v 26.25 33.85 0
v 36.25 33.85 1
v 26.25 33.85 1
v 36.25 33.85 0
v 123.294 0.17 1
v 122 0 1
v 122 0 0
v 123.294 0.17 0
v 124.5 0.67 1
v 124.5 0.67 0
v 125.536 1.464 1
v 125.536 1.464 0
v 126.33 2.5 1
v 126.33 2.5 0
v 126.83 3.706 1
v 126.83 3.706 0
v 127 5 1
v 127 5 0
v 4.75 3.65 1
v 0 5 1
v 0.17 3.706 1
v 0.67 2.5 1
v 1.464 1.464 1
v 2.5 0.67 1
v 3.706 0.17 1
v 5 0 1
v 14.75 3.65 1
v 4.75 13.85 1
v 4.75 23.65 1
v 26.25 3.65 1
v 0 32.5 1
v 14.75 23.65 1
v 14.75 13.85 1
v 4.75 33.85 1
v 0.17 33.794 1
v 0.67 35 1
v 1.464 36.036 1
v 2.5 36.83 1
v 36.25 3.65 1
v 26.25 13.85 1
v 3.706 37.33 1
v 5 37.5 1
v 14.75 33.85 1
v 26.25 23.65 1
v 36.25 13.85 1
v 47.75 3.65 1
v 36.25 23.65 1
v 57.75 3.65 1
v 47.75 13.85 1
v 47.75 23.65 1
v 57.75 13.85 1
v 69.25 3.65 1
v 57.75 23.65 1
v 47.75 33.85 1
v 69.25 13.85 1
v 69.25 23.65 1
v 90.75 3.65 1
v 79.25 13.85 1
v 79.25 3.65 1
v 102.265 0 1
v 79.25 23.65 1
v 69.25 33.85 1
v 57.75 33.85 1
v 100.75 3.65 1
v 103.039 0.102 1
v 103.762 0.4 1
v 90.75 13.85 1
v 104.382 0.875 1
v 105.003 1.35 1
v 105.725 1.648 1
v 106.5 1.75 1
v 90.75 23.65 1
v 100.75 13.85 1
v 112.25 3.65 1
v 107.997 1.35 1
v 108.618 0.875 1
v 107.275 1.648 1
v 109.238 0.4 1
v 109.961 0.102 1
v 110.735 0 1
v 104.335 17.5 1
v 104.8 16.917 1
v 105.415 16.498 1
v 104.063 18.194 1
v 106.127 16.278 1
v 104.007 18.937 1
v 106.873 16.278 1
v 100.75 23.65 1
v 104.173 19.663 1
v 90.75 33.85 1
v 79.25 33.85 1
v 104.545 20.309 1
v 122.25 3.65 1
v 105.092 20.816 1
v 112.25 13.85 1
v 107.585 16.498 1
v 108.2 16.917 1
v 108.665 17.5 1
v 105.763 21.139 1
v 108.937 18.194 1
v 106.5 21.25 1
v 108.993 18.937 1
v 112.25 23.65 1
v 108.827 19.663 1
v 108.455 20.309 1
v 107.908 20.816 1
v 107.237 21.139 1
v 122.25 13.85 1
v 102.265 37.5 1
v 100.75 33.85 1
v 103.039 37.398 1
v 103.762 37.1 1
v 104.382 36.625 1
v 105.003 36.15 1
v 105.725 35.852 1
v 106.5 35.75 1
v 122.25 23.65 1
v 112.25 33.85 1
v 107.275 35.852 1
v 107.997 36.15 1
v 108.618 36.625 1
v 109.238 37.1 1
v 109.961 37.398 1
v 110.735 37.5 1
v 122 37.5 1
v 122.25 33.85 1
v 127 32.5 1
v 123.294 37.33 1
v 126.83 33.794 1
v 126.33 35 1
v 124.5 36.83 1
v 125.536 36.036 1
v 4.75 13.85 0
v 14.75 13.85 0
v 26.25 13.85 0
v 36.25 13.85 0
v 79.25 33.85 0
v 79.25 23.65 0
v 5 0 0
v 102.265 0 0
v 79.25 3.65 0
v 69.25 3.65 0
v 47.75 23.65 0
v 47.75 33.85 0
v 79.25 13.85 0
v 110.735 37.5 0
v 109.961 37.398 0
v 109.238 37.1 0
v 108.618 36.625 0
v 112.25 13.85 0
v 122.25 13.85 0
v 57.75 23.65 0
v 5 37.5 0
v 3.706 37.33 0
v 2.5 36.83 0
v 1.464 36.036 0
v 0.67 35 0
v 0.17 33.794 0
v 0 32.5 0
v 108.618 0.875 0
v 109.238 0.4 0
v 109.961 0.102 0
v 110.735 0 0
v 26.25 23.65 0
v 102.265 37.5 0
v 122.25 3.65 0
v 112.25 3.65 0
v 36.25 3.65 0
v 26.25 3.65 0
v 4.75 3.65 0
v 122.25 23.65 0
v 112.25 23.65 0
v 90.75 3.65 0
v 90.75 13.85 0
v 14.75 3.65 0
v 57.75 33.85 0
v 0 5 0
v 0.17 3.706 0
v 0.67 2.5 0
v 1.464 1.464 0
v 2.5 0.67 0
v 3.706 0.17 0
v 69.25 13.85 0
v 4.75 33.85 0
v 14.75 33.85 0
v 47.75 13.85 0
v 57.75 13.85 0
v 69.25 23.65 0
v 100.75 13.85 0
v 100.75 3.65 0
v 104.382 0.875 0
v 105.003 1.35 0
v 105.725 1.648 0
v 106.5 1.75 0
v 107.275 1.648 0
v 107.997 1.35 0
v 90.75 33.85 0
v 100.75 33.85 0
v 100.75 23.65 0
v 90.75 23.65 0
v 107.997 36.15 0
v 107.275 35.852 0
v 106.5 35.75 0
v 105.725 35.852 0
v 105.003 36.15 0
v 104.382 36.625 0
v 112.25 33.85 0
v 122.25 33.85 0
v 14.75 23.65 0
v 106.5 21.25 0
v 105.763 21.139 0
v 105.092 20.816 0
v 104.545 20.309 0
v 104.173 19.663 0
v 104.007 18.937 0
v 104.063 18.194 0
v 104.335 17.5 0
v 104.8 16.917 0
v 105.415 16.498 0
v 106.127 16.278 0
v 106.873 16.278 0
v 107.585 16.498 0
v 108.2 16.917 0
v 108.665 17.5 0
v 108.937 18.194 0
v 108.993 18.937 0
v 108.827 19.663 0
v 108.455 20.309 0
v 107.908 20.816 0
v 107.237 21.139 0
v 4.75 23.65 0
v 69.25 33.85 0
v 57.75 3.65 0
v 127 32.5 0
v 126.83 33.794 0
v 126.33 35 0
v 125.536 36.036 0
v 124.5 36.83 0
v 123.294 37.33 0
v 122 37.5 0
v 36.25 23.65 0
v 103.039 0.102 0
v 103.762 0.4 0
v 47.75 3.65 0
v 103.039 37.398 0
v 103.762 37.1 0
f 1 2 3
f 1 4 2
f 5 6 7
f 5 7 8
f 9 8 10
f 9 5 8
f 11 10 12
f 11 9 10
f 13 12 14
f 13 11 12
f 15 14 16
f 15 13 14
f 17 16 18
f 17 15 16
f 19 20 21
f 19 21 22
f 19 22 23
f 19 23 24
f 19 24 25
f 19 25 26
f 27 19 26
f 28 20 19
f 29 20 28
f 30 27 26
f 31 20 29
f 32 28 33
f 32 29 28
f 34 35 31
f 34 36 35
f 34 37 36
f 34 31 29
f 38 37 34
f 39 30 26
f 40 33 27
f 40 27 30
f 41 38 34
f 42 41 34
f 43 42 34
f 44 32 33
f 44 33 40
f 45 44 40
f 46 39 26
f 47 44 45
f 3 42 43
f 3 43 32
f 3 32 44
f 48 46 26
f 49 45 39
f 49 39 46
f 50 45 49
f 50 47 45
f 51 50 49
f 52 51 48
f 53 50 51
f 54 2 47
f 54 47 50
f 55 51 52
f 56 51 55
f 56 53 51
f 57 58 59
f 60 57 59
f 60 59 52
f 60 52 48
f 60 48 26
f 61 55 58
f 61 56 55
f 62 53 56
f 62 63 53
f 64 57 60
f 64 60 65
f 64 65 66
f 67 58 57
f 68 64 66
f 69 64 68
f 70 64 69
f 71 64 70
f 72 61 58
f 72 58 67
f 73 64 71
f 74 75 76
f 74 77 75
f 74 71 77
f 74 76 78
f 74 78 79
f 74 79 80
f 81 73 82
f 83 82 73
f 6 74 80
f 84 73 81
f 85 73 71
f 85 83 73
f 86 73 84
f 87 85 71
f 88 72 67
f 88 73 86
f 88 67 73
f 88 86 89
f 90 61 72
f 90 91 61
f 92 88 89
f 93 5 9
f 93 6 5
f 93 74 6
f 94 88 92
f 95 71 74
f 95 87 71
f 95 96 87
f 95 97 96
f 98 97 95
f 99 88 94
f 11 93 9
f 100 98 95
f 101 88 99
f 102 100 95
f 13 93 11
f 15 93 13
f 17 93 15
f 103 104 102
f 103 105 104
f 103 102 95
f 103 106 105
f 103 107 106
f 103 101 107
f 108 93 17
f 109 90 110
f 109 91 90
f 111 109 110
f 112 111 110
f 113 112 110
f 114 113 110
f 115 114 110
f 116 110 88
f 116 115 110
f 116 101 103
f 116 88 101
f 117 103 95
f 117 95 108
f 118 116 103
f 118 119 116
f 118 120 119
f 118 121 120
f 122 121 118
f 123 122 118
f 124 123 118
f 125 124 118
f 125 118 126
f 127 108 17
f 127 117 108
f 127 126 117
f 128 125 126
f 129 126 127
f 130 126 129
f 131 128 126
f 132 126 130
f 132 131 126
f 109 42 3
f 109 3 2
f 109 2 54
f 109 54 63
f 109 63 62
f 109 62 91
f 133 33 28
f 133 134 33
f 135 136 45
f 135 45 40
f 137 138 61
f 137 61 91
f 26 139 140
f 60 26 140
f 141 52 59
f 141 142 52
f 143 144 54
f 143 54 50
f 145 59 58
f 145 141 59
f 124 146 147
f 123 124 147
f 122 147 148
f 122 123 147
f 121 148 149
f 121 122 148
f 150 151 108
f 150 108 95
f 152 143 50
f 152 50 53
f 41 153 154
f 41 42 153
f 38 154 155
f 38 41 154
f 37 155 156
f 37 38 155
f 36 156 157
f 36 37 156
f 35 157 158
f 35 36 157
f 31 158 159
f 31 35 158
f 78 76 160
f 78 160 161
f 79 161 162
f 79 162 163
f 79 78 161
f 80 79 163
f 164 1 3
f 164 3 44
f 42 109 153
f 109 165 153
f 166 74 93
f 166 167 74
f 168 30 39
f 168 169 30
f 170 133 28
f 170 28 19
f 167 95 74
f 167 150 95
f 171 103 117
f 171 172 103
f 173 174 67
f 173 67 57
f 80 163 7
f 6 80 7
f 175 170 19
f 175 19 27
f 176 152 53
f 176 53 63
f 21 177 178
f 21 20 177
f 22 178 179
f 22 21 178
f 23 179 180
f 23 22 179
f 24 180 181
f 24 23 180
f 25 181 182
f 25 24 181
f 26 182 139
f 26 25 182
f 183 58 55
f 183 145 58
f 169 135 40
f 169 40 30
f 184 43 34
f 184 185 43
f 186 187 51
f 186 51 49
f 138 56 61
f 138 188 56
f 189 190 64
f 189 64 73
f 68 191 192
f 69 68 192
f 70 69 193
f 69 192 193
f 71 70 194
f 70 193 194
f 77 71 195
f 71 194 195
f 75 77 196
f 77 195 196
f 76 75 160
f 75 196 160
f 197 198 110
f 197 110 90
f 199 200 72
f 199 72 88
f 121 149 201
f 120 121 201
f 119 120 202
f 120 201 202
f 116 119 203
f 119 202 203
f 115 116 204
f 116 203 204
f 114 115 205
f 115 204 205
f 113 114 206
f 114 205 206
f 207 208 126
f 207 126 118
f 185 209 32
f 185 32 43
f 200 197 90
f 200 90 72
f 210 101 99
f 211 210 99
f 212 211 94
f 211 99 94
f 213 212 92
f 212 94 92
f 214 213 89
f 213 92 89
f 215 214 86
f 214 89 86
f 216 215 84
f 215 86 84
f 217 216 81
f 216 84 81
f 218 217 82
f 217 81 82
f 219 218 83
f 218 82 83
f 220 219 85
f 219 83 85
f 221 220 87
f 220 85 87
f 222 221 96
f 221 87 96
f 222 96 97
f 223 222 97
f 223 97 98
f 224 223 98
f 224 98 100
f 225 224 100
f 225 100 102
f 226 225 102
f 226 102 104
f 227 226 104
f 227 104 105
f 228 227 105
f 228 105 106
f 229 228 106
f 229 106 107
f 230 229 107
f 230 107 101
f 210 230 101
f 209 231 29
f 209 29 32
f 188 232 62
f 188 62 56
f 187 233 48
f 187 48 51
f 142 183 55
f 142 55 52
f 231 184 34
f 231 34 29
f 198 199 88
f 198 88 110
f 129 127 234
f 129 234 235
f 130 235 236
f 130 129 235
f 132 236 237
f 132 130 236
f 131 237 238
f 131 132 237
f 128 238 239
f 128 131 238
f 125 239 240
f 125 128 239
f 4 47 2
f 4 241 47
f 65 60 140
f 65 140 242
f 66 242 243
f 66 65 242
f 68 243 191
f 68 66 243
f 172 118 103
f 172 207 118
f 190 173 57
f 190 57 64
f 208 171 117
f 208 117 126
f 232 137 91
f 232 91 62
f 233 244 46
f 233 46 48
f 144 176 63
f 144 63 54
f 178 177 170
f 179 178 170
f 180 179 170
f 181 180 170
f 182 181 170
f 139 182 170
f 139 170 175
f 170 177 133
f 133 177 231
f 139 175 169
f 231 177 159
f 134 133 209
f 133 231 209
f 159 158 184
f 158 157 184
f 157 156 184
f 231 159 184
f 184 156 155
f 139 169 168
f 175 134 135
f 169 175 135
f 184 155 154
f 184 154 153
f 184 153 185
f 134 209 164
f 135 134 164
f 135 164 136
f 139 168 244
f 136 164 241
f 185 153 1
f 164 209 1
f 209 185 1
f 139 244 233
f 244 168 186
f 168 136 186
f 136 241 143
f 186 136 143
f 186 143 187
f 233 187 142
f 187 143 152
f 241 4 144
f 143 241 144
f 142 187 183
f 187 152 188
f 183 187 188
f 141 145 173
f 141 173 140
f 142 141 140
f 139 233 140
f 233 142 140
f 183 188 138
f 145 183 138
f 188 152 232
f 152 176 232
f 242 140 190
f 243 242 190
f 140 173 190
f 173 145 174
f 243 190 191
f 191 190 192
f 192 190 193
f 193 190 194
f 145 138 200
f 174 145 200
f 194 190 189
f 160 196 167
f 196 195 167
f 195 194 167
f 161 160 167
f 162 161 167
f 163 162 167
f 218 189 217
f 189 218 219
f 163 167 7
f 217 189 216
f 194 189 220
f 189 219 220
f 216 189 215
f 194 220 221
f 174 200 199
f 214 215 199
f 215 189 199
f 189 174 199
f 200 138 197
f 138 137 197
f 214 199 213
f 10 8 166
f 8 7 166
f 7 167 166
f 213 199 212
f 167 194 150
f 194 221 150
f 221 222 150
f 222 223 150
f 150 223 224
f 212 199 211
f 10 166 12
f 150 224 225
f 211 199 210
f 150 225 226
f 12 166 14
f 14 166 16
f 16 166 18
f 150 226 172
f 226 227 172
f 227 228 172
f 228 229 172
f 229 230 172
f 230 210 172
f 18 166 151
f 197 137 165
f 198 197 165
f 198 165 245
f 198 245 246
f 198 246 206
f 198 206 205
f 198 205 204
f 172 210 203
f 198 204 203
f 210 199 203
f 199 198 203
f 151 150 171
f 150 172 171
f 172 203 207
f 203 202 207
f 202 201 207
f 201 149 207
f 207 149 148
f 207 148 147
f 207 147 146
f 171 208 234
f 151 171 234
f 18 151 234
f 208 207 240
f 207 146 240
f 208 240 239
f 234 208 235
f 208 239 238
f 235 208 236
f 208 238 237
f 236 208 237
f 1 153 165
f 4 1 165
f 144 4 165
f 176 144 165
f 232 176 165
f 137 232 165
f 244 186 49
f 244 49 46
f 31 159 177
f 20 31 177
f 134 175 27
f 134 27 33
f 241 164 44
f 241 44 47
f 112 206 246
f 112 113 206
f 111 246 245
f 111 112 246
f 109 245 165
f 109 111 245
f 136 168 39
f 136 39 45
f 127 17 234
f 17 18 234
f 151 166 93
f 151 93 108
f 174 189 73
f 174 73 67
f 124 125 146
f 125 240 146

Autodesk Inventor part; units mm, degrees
ref_plane "YZ Plane" through (0, 0, 0) normal (1, 0, 0) x (0, 1, 0)
ref_plane "XZ Plane" through (0, 0, 0) normal (0, 1, 0) x (-1, 0, 0)
ref_plane "XY Plane" through (0, 0, 0) normal (0, 0, 1) x (1, 0, 0)
sketch "Skizze1" plane through (0, 0, 0) normal (0, 0, 1) x (1, 0, 0)
  line L0 (0, 0) -> (127, 0)
  line L1 (127, 0) -> (127, 37.5)
  line L2 (127, 37.5) -> (0, 37.5)
  line L3 (0, 37.5) -> (0, 0)
  line L4 (4.75, 3.65) -> (14.75, 3.65)
  line L5 (14.75, 3.65) -> (14.75, 13.85)
  line L6 (14.75, 13.85) -> (4.75, 13.85)
  line L7 (4.75, 13.85) -> (4.75, 3.65)
  line L8 (4.75, 33.85) -> (4.75, 23.65)
  line L9 (14.75, 33.85) -> (4.75, 33.85)
  line L10 (14.75, 23.65) -> (14.75, 33.85)
  line L11 (4.75, 23.65) -> (14.75, 23.65)
  line L12 (26.25, 13.85) -> (26.25, 3.65)
  line L13 (36.25, 13.85) -> (26.25, 13.85)
  line L14 (36.25, 3.65) -> (36.25, 13.85)
  line L15 (26.25, 3.65) -> (36.25, 3.65)
  line L16 (26.25, 33.85) -> (26.25, 23.65)
  line L17 (36.25, 33.85) -> (26.25, 33.85)
  line L18 (36.25, 23.65) -> (36.25, 33.85)
  line L19 (26.25, 23.65) -> (36.25, 23.65)
  line L20 (47.75, 13.85) -> (47.75, 3.65)
  line L21 (57.75, 13.85) -> (47.75, 13.85)
  line L22 (57.75, 3.65) -> (57.75, 13.85)
  line L23 (47.75, 3.65) -> (57.75, 3.65)
  line L24 (47.75, 33.85) -> (47.75, 23.65)
  line L25 (57.75, 33.85) -> (47.75, 33.85)
  line L26 (57.75, 23.65) -> (57.75, 33.85)
  line L27 (47.75, 23.65) -> (57.75, 23.65)
  line L28 (69.25, 13.85) -> (69.25, 3.65)
  line L29 (79.25, 13.85) -> (69.25, 13.85)
  line L30 (79.25, 3.65) -> (79.25, 13.85)
  line L31 (69.25, 3.65) -> (79.25, 3.65)
  line L32 (69.25, 33.85) -> (69.25, 23.65)
  line L33 (79.25, 33.85) -> (69.25, 33.85)
  line L34 (79.25, 23.65) -> (79.25, 33.85)
  line L35 (69.25, 23.65) -> (79.25, 23.65)
  line L36 (90.75, 13.85) -> (90.75, 3.65)
  line L37 (100.75, 13.85) -> (90.75, 13.85)
  line L38 (100.75, 3.65) -> (100.75, 13.85)
  line L39 (90.75, 3.65) -> (100.75, 3.65)
  line L40 (90.75, 33.85) -> (90.75, 23.65)
  line L41 (100.75, 33.85) -> (90.75, 33.85)
  line L42 (100.75, 23.65) -> (100.75, 33.85)
  line L43 (90.75, 23.65) -> (100.75, 23.65)
  line L44 (112.25, 13.85) -> (112.25, 3.65)
  line L45 (122.25, 13.85) -> (112.25, 13.85)
  line L46 (122.25, 3.65) -> (122.25, 13.85)
  line L47 (112.25, 3.65) -> (122.25, 3.65)
  line L48 (112.25, 33.85) -> (112.25, 23.65)
  line L49 (122.25, 33.85) -> (112.25, 33.85)
  line L50 (122.25, 23.65) -> (122.25, 33.85)
  line L51 (112.25, 23.65) -> (122.25, 23.65)
  arc A0 (109.2272, 0) -> (103.7728, 0) centre (106.5, -1.25) ccw
  arc A1 (103.7728, 37.5) -> (109.2272, 37.5) centre (106.5, 38.75) ccw
  point P0 (0, 18.75)
  point P1 (63.5, 37.5)
  point P2 (42, 18.75)
  point P3 (85, 18.75)
  point P4 (63.5, 0)
  point P5 (4.75, 28.75)
  point P6 (95.75, 3.65)
  point P7 (106.5, 18.75)
  dimension "d0" = 127
  dimension "d1" = 37.5
  dimension "d2" = 10.2
  dimension "d3" = 10
  dimension "d6" = 20
  dimension "d9" = 21.5
  dimension "d13" = 5.75
  dimension "d17" = 43
  dimension "d18" = 21.5
  dimension "d19" = 10
  dimension "d20" = 3
  dimension "d21" = 1.25
  dimension "d22" = 10.75
  dimension "d23" = 1.25
extrude "Extrusion1" add sketch "Skizze1" along normal blind 1 contours L3 L2 A1 L1 L0 A0
fillet "Rundung1" radius 5 4 edges at (127, 37.5, 0.5) (127, 0, 0.5) (0, 37.5, 0.5) (0, 0, 0.5)
fillet "Rundung2" radius 3 4 edges at (103.7728, 0, 0.5) (109.2272, 0, 0.5) (103.7728, 37.5, 0.5) (109.2272, 37.5, 0.5)
hole "Bohrung1" at (106.5, 18.75, 0) direction (0, 0, 1) diameter 5 end through all
sketch "Skizze2" plane through (0, 0, 1) normal (0, 0, 1) x (1, 0, 0)
  arc A0 (0, 5) -> (5, 0) centre (5, 5) ccw projected
  line L0 (5, 0) -> (102.2647, 0) projected
  arc A1 (122, 0) -> (127, 5) centre (122, 5) ccw projected
  line L1 (127, 5) -> (127, 32.5) projected
  arc A2 (127, 32.5) -> (122, 37.5) centre (122, 32.5) ccw projected
  line L2 (122, 37.5) -> (110.7353, 37.5) projected
  arc A3 (5, 37.5) -> (0, 32.5) centre (5, 32.5) ccw projected
  line L3 (0, 32.5) -> (0, 5) projected
  line L4 (112.25, 33.85) -> (122.25, 33.85) projected
  line L5 (122.25, 33.85) -> (122.25, 23.65) projected
  line L6 (122.25, 23.65) -> (112.25, 23.65) projected
  line L7 (112.25, 23.65) -> (112.25, 33.85) projected
  line L8 (112.25, 13.85) -> (122.25, 13.85) projected
  line L9 (122.25, 13.85) -> (122.25, 3.65) projected
  line L10 (122.25, 3.65) -> (112.25, 3.65) projected
  line L11 (112.25, 3.65) -> (112.25, 13.85) projected
  line L12 (90.75, 33.85) -> (100.75, 33.85) projected
  line L13 (100.75, 33.85) -> (100.75, 23.65) projected
  line L14 (100.75, 23.65) -> (90.75, 23.65) projected
  line L15 (90.75, 23.65) -> (90.75, 33.85) projected
  line L16 (90.75, 13.85) -> (100.75, 13.85) projected
  line L17 (100.75, 13.85) -> (100.75, 3.65) projected
  line L18 (100.75, 3.65) -> (90.75, 3.65) projected
  line L19 (90.75, 3.65) -> (90.75, 13.85) projected
  line L20 (69.25, 33.85) -> (79.25, 33.85) projected
  line L21 (79.25, 33.85) -> (79.25, 23.65) projected
  line L22 (79.25, 23.65) -> (69.25, 23.65) projected
  line L23 (69.25, 23.65) -> (69.25, 33.85) projected
  line L24 (69.25, 13.85) -> (79.25, 13.85) projected
  line L25 (79.25, 13.85) -> (79.25, 3.65) projected
  line L26 (79.25, 3.65) -> (69.25, 3.65) projected
  line L27 (69.25, 3.65) -> (69.25, 13.85) projected
  line L28 (47.75, 33.85) -> (57.75, 33.85) projected
  line L29 (57.75, 33.85) -> (57.75, 23.65) projected
  line L30 (57.75, 23.65) -> (47.75, 23.65) projected
  line L31 (47.75, 23.65) -> (47.75, 33.85) projected
  line L32 (47.75, 13.85) -> (57.75, 13.85) projected
  line L33 (57.75, 13.85) -> (57.75, 3.65) projected
  line L34 (57.75, 3.65) -> (47.75, 3.65) projected
  line L35 (47.75, 3.65) -> (47.75, 13.85) projected
  line L36 (26.25, 33.85) -> (36.25, 33.85) projected
  line L37 (36.25, 33.85) -> (36.25, 23.65) projected
  line L38 (36.25, 23.65) -> (26.25, 23.65) projected
  line L39 (26.25, 23.65) -> (26.25, 33.85) projected
  line L40 (26.25, 13.85) -> (36.25, 13.85) projected
  line L41 (36.25, 13.85) -> (36.25, 3.65) projected
  line L42 (36.25, 3.65) -> (26.25, 3.65) projected
  line L43 (26.25, 3.65) -> (26.25, 13.85) projected
  line L44 (4.75, 33.85) -> (14.75, 33.85) projected
  line L45 (14.75, 33.85) -> (14.75, 23.65) projected
  line L46 (14.75, 23.65) -> (4.75, 23.65) projected
  line L47 (4.75, 23.65) -> (4.75, 33.85) projected
  line L48 (4.75, 3.65) -> (4.75, 13.85) projected
  line L49 (4.75, 13.85) -> (14.75, 13.85) projected
  line L50 (14.75, 13.85) -> (14.75, 3.65) projected
  line L51 (14.75, 3.65) -> (4.75, 3.65) projected
  arc A4 (108.6176, 0.875) -> (104.3824, 0.875) centre (106.5, -1.25) ccw projected
  line L52 (110.7353, 0) -> (122, 0) projected
  arc A5 (104.3824, 36.625) -> (108.6176, 36.625) centre (106.5, 38.75) ccw projected
  line L53 (102.2647, 37.5) -> (5, 37.5) projected
  arc A6 (110.7353, 37.5) -> (108.6176, 36.625) centre (110.7353, 34.5) ccw projected
  arc A7 (104.3824, 36.625) -> (102.2647, 37.5) centre (102.2647, 34.5) ccw projected
  arc A8 (102.2647, 0) -> (104.3824, 0.875) centre (102.2647, 3) ccw projected
  arc A9 (108.6176, 0.875) -> (110.7353, 0) centre (110.7353, 3) ccw projected
  point P0 (0, 0)
equation "\"d13\" = -0.5 * d3 + 0.5 * d9"
equation "\"d17\" = 2 * d9"
equation "\"d18\" = 0.5 * d17"
equation "\"d19\" = 0.5 * d6"
equation "\"d22\" = 0.5 * d18"
equation "\"d23\" = d21"
equation "\"Biegeradius\" = Stärke"
equation "\"BreiteBiegungsfreistellung\" = Stärke"
equation "\"TiefeBiegungsfreistellung\" = 0.5 * Stärke"
equation "\"GrößeEckenfreistellung\" = 4 * Stärke"
equation "\"MinimalRest\" = 2 * Stärke"
equation "\"Übergangsradius\" = Biegeradius"
equation "\"JacobiRadiusGröße\" = Biegeradius"
equation "\"Abstandsgröße\" = Stärke"
equation "\"Stärke\" = 0.5"
properties part number "bat_contacts_v2_plate" material "Kupfer"
